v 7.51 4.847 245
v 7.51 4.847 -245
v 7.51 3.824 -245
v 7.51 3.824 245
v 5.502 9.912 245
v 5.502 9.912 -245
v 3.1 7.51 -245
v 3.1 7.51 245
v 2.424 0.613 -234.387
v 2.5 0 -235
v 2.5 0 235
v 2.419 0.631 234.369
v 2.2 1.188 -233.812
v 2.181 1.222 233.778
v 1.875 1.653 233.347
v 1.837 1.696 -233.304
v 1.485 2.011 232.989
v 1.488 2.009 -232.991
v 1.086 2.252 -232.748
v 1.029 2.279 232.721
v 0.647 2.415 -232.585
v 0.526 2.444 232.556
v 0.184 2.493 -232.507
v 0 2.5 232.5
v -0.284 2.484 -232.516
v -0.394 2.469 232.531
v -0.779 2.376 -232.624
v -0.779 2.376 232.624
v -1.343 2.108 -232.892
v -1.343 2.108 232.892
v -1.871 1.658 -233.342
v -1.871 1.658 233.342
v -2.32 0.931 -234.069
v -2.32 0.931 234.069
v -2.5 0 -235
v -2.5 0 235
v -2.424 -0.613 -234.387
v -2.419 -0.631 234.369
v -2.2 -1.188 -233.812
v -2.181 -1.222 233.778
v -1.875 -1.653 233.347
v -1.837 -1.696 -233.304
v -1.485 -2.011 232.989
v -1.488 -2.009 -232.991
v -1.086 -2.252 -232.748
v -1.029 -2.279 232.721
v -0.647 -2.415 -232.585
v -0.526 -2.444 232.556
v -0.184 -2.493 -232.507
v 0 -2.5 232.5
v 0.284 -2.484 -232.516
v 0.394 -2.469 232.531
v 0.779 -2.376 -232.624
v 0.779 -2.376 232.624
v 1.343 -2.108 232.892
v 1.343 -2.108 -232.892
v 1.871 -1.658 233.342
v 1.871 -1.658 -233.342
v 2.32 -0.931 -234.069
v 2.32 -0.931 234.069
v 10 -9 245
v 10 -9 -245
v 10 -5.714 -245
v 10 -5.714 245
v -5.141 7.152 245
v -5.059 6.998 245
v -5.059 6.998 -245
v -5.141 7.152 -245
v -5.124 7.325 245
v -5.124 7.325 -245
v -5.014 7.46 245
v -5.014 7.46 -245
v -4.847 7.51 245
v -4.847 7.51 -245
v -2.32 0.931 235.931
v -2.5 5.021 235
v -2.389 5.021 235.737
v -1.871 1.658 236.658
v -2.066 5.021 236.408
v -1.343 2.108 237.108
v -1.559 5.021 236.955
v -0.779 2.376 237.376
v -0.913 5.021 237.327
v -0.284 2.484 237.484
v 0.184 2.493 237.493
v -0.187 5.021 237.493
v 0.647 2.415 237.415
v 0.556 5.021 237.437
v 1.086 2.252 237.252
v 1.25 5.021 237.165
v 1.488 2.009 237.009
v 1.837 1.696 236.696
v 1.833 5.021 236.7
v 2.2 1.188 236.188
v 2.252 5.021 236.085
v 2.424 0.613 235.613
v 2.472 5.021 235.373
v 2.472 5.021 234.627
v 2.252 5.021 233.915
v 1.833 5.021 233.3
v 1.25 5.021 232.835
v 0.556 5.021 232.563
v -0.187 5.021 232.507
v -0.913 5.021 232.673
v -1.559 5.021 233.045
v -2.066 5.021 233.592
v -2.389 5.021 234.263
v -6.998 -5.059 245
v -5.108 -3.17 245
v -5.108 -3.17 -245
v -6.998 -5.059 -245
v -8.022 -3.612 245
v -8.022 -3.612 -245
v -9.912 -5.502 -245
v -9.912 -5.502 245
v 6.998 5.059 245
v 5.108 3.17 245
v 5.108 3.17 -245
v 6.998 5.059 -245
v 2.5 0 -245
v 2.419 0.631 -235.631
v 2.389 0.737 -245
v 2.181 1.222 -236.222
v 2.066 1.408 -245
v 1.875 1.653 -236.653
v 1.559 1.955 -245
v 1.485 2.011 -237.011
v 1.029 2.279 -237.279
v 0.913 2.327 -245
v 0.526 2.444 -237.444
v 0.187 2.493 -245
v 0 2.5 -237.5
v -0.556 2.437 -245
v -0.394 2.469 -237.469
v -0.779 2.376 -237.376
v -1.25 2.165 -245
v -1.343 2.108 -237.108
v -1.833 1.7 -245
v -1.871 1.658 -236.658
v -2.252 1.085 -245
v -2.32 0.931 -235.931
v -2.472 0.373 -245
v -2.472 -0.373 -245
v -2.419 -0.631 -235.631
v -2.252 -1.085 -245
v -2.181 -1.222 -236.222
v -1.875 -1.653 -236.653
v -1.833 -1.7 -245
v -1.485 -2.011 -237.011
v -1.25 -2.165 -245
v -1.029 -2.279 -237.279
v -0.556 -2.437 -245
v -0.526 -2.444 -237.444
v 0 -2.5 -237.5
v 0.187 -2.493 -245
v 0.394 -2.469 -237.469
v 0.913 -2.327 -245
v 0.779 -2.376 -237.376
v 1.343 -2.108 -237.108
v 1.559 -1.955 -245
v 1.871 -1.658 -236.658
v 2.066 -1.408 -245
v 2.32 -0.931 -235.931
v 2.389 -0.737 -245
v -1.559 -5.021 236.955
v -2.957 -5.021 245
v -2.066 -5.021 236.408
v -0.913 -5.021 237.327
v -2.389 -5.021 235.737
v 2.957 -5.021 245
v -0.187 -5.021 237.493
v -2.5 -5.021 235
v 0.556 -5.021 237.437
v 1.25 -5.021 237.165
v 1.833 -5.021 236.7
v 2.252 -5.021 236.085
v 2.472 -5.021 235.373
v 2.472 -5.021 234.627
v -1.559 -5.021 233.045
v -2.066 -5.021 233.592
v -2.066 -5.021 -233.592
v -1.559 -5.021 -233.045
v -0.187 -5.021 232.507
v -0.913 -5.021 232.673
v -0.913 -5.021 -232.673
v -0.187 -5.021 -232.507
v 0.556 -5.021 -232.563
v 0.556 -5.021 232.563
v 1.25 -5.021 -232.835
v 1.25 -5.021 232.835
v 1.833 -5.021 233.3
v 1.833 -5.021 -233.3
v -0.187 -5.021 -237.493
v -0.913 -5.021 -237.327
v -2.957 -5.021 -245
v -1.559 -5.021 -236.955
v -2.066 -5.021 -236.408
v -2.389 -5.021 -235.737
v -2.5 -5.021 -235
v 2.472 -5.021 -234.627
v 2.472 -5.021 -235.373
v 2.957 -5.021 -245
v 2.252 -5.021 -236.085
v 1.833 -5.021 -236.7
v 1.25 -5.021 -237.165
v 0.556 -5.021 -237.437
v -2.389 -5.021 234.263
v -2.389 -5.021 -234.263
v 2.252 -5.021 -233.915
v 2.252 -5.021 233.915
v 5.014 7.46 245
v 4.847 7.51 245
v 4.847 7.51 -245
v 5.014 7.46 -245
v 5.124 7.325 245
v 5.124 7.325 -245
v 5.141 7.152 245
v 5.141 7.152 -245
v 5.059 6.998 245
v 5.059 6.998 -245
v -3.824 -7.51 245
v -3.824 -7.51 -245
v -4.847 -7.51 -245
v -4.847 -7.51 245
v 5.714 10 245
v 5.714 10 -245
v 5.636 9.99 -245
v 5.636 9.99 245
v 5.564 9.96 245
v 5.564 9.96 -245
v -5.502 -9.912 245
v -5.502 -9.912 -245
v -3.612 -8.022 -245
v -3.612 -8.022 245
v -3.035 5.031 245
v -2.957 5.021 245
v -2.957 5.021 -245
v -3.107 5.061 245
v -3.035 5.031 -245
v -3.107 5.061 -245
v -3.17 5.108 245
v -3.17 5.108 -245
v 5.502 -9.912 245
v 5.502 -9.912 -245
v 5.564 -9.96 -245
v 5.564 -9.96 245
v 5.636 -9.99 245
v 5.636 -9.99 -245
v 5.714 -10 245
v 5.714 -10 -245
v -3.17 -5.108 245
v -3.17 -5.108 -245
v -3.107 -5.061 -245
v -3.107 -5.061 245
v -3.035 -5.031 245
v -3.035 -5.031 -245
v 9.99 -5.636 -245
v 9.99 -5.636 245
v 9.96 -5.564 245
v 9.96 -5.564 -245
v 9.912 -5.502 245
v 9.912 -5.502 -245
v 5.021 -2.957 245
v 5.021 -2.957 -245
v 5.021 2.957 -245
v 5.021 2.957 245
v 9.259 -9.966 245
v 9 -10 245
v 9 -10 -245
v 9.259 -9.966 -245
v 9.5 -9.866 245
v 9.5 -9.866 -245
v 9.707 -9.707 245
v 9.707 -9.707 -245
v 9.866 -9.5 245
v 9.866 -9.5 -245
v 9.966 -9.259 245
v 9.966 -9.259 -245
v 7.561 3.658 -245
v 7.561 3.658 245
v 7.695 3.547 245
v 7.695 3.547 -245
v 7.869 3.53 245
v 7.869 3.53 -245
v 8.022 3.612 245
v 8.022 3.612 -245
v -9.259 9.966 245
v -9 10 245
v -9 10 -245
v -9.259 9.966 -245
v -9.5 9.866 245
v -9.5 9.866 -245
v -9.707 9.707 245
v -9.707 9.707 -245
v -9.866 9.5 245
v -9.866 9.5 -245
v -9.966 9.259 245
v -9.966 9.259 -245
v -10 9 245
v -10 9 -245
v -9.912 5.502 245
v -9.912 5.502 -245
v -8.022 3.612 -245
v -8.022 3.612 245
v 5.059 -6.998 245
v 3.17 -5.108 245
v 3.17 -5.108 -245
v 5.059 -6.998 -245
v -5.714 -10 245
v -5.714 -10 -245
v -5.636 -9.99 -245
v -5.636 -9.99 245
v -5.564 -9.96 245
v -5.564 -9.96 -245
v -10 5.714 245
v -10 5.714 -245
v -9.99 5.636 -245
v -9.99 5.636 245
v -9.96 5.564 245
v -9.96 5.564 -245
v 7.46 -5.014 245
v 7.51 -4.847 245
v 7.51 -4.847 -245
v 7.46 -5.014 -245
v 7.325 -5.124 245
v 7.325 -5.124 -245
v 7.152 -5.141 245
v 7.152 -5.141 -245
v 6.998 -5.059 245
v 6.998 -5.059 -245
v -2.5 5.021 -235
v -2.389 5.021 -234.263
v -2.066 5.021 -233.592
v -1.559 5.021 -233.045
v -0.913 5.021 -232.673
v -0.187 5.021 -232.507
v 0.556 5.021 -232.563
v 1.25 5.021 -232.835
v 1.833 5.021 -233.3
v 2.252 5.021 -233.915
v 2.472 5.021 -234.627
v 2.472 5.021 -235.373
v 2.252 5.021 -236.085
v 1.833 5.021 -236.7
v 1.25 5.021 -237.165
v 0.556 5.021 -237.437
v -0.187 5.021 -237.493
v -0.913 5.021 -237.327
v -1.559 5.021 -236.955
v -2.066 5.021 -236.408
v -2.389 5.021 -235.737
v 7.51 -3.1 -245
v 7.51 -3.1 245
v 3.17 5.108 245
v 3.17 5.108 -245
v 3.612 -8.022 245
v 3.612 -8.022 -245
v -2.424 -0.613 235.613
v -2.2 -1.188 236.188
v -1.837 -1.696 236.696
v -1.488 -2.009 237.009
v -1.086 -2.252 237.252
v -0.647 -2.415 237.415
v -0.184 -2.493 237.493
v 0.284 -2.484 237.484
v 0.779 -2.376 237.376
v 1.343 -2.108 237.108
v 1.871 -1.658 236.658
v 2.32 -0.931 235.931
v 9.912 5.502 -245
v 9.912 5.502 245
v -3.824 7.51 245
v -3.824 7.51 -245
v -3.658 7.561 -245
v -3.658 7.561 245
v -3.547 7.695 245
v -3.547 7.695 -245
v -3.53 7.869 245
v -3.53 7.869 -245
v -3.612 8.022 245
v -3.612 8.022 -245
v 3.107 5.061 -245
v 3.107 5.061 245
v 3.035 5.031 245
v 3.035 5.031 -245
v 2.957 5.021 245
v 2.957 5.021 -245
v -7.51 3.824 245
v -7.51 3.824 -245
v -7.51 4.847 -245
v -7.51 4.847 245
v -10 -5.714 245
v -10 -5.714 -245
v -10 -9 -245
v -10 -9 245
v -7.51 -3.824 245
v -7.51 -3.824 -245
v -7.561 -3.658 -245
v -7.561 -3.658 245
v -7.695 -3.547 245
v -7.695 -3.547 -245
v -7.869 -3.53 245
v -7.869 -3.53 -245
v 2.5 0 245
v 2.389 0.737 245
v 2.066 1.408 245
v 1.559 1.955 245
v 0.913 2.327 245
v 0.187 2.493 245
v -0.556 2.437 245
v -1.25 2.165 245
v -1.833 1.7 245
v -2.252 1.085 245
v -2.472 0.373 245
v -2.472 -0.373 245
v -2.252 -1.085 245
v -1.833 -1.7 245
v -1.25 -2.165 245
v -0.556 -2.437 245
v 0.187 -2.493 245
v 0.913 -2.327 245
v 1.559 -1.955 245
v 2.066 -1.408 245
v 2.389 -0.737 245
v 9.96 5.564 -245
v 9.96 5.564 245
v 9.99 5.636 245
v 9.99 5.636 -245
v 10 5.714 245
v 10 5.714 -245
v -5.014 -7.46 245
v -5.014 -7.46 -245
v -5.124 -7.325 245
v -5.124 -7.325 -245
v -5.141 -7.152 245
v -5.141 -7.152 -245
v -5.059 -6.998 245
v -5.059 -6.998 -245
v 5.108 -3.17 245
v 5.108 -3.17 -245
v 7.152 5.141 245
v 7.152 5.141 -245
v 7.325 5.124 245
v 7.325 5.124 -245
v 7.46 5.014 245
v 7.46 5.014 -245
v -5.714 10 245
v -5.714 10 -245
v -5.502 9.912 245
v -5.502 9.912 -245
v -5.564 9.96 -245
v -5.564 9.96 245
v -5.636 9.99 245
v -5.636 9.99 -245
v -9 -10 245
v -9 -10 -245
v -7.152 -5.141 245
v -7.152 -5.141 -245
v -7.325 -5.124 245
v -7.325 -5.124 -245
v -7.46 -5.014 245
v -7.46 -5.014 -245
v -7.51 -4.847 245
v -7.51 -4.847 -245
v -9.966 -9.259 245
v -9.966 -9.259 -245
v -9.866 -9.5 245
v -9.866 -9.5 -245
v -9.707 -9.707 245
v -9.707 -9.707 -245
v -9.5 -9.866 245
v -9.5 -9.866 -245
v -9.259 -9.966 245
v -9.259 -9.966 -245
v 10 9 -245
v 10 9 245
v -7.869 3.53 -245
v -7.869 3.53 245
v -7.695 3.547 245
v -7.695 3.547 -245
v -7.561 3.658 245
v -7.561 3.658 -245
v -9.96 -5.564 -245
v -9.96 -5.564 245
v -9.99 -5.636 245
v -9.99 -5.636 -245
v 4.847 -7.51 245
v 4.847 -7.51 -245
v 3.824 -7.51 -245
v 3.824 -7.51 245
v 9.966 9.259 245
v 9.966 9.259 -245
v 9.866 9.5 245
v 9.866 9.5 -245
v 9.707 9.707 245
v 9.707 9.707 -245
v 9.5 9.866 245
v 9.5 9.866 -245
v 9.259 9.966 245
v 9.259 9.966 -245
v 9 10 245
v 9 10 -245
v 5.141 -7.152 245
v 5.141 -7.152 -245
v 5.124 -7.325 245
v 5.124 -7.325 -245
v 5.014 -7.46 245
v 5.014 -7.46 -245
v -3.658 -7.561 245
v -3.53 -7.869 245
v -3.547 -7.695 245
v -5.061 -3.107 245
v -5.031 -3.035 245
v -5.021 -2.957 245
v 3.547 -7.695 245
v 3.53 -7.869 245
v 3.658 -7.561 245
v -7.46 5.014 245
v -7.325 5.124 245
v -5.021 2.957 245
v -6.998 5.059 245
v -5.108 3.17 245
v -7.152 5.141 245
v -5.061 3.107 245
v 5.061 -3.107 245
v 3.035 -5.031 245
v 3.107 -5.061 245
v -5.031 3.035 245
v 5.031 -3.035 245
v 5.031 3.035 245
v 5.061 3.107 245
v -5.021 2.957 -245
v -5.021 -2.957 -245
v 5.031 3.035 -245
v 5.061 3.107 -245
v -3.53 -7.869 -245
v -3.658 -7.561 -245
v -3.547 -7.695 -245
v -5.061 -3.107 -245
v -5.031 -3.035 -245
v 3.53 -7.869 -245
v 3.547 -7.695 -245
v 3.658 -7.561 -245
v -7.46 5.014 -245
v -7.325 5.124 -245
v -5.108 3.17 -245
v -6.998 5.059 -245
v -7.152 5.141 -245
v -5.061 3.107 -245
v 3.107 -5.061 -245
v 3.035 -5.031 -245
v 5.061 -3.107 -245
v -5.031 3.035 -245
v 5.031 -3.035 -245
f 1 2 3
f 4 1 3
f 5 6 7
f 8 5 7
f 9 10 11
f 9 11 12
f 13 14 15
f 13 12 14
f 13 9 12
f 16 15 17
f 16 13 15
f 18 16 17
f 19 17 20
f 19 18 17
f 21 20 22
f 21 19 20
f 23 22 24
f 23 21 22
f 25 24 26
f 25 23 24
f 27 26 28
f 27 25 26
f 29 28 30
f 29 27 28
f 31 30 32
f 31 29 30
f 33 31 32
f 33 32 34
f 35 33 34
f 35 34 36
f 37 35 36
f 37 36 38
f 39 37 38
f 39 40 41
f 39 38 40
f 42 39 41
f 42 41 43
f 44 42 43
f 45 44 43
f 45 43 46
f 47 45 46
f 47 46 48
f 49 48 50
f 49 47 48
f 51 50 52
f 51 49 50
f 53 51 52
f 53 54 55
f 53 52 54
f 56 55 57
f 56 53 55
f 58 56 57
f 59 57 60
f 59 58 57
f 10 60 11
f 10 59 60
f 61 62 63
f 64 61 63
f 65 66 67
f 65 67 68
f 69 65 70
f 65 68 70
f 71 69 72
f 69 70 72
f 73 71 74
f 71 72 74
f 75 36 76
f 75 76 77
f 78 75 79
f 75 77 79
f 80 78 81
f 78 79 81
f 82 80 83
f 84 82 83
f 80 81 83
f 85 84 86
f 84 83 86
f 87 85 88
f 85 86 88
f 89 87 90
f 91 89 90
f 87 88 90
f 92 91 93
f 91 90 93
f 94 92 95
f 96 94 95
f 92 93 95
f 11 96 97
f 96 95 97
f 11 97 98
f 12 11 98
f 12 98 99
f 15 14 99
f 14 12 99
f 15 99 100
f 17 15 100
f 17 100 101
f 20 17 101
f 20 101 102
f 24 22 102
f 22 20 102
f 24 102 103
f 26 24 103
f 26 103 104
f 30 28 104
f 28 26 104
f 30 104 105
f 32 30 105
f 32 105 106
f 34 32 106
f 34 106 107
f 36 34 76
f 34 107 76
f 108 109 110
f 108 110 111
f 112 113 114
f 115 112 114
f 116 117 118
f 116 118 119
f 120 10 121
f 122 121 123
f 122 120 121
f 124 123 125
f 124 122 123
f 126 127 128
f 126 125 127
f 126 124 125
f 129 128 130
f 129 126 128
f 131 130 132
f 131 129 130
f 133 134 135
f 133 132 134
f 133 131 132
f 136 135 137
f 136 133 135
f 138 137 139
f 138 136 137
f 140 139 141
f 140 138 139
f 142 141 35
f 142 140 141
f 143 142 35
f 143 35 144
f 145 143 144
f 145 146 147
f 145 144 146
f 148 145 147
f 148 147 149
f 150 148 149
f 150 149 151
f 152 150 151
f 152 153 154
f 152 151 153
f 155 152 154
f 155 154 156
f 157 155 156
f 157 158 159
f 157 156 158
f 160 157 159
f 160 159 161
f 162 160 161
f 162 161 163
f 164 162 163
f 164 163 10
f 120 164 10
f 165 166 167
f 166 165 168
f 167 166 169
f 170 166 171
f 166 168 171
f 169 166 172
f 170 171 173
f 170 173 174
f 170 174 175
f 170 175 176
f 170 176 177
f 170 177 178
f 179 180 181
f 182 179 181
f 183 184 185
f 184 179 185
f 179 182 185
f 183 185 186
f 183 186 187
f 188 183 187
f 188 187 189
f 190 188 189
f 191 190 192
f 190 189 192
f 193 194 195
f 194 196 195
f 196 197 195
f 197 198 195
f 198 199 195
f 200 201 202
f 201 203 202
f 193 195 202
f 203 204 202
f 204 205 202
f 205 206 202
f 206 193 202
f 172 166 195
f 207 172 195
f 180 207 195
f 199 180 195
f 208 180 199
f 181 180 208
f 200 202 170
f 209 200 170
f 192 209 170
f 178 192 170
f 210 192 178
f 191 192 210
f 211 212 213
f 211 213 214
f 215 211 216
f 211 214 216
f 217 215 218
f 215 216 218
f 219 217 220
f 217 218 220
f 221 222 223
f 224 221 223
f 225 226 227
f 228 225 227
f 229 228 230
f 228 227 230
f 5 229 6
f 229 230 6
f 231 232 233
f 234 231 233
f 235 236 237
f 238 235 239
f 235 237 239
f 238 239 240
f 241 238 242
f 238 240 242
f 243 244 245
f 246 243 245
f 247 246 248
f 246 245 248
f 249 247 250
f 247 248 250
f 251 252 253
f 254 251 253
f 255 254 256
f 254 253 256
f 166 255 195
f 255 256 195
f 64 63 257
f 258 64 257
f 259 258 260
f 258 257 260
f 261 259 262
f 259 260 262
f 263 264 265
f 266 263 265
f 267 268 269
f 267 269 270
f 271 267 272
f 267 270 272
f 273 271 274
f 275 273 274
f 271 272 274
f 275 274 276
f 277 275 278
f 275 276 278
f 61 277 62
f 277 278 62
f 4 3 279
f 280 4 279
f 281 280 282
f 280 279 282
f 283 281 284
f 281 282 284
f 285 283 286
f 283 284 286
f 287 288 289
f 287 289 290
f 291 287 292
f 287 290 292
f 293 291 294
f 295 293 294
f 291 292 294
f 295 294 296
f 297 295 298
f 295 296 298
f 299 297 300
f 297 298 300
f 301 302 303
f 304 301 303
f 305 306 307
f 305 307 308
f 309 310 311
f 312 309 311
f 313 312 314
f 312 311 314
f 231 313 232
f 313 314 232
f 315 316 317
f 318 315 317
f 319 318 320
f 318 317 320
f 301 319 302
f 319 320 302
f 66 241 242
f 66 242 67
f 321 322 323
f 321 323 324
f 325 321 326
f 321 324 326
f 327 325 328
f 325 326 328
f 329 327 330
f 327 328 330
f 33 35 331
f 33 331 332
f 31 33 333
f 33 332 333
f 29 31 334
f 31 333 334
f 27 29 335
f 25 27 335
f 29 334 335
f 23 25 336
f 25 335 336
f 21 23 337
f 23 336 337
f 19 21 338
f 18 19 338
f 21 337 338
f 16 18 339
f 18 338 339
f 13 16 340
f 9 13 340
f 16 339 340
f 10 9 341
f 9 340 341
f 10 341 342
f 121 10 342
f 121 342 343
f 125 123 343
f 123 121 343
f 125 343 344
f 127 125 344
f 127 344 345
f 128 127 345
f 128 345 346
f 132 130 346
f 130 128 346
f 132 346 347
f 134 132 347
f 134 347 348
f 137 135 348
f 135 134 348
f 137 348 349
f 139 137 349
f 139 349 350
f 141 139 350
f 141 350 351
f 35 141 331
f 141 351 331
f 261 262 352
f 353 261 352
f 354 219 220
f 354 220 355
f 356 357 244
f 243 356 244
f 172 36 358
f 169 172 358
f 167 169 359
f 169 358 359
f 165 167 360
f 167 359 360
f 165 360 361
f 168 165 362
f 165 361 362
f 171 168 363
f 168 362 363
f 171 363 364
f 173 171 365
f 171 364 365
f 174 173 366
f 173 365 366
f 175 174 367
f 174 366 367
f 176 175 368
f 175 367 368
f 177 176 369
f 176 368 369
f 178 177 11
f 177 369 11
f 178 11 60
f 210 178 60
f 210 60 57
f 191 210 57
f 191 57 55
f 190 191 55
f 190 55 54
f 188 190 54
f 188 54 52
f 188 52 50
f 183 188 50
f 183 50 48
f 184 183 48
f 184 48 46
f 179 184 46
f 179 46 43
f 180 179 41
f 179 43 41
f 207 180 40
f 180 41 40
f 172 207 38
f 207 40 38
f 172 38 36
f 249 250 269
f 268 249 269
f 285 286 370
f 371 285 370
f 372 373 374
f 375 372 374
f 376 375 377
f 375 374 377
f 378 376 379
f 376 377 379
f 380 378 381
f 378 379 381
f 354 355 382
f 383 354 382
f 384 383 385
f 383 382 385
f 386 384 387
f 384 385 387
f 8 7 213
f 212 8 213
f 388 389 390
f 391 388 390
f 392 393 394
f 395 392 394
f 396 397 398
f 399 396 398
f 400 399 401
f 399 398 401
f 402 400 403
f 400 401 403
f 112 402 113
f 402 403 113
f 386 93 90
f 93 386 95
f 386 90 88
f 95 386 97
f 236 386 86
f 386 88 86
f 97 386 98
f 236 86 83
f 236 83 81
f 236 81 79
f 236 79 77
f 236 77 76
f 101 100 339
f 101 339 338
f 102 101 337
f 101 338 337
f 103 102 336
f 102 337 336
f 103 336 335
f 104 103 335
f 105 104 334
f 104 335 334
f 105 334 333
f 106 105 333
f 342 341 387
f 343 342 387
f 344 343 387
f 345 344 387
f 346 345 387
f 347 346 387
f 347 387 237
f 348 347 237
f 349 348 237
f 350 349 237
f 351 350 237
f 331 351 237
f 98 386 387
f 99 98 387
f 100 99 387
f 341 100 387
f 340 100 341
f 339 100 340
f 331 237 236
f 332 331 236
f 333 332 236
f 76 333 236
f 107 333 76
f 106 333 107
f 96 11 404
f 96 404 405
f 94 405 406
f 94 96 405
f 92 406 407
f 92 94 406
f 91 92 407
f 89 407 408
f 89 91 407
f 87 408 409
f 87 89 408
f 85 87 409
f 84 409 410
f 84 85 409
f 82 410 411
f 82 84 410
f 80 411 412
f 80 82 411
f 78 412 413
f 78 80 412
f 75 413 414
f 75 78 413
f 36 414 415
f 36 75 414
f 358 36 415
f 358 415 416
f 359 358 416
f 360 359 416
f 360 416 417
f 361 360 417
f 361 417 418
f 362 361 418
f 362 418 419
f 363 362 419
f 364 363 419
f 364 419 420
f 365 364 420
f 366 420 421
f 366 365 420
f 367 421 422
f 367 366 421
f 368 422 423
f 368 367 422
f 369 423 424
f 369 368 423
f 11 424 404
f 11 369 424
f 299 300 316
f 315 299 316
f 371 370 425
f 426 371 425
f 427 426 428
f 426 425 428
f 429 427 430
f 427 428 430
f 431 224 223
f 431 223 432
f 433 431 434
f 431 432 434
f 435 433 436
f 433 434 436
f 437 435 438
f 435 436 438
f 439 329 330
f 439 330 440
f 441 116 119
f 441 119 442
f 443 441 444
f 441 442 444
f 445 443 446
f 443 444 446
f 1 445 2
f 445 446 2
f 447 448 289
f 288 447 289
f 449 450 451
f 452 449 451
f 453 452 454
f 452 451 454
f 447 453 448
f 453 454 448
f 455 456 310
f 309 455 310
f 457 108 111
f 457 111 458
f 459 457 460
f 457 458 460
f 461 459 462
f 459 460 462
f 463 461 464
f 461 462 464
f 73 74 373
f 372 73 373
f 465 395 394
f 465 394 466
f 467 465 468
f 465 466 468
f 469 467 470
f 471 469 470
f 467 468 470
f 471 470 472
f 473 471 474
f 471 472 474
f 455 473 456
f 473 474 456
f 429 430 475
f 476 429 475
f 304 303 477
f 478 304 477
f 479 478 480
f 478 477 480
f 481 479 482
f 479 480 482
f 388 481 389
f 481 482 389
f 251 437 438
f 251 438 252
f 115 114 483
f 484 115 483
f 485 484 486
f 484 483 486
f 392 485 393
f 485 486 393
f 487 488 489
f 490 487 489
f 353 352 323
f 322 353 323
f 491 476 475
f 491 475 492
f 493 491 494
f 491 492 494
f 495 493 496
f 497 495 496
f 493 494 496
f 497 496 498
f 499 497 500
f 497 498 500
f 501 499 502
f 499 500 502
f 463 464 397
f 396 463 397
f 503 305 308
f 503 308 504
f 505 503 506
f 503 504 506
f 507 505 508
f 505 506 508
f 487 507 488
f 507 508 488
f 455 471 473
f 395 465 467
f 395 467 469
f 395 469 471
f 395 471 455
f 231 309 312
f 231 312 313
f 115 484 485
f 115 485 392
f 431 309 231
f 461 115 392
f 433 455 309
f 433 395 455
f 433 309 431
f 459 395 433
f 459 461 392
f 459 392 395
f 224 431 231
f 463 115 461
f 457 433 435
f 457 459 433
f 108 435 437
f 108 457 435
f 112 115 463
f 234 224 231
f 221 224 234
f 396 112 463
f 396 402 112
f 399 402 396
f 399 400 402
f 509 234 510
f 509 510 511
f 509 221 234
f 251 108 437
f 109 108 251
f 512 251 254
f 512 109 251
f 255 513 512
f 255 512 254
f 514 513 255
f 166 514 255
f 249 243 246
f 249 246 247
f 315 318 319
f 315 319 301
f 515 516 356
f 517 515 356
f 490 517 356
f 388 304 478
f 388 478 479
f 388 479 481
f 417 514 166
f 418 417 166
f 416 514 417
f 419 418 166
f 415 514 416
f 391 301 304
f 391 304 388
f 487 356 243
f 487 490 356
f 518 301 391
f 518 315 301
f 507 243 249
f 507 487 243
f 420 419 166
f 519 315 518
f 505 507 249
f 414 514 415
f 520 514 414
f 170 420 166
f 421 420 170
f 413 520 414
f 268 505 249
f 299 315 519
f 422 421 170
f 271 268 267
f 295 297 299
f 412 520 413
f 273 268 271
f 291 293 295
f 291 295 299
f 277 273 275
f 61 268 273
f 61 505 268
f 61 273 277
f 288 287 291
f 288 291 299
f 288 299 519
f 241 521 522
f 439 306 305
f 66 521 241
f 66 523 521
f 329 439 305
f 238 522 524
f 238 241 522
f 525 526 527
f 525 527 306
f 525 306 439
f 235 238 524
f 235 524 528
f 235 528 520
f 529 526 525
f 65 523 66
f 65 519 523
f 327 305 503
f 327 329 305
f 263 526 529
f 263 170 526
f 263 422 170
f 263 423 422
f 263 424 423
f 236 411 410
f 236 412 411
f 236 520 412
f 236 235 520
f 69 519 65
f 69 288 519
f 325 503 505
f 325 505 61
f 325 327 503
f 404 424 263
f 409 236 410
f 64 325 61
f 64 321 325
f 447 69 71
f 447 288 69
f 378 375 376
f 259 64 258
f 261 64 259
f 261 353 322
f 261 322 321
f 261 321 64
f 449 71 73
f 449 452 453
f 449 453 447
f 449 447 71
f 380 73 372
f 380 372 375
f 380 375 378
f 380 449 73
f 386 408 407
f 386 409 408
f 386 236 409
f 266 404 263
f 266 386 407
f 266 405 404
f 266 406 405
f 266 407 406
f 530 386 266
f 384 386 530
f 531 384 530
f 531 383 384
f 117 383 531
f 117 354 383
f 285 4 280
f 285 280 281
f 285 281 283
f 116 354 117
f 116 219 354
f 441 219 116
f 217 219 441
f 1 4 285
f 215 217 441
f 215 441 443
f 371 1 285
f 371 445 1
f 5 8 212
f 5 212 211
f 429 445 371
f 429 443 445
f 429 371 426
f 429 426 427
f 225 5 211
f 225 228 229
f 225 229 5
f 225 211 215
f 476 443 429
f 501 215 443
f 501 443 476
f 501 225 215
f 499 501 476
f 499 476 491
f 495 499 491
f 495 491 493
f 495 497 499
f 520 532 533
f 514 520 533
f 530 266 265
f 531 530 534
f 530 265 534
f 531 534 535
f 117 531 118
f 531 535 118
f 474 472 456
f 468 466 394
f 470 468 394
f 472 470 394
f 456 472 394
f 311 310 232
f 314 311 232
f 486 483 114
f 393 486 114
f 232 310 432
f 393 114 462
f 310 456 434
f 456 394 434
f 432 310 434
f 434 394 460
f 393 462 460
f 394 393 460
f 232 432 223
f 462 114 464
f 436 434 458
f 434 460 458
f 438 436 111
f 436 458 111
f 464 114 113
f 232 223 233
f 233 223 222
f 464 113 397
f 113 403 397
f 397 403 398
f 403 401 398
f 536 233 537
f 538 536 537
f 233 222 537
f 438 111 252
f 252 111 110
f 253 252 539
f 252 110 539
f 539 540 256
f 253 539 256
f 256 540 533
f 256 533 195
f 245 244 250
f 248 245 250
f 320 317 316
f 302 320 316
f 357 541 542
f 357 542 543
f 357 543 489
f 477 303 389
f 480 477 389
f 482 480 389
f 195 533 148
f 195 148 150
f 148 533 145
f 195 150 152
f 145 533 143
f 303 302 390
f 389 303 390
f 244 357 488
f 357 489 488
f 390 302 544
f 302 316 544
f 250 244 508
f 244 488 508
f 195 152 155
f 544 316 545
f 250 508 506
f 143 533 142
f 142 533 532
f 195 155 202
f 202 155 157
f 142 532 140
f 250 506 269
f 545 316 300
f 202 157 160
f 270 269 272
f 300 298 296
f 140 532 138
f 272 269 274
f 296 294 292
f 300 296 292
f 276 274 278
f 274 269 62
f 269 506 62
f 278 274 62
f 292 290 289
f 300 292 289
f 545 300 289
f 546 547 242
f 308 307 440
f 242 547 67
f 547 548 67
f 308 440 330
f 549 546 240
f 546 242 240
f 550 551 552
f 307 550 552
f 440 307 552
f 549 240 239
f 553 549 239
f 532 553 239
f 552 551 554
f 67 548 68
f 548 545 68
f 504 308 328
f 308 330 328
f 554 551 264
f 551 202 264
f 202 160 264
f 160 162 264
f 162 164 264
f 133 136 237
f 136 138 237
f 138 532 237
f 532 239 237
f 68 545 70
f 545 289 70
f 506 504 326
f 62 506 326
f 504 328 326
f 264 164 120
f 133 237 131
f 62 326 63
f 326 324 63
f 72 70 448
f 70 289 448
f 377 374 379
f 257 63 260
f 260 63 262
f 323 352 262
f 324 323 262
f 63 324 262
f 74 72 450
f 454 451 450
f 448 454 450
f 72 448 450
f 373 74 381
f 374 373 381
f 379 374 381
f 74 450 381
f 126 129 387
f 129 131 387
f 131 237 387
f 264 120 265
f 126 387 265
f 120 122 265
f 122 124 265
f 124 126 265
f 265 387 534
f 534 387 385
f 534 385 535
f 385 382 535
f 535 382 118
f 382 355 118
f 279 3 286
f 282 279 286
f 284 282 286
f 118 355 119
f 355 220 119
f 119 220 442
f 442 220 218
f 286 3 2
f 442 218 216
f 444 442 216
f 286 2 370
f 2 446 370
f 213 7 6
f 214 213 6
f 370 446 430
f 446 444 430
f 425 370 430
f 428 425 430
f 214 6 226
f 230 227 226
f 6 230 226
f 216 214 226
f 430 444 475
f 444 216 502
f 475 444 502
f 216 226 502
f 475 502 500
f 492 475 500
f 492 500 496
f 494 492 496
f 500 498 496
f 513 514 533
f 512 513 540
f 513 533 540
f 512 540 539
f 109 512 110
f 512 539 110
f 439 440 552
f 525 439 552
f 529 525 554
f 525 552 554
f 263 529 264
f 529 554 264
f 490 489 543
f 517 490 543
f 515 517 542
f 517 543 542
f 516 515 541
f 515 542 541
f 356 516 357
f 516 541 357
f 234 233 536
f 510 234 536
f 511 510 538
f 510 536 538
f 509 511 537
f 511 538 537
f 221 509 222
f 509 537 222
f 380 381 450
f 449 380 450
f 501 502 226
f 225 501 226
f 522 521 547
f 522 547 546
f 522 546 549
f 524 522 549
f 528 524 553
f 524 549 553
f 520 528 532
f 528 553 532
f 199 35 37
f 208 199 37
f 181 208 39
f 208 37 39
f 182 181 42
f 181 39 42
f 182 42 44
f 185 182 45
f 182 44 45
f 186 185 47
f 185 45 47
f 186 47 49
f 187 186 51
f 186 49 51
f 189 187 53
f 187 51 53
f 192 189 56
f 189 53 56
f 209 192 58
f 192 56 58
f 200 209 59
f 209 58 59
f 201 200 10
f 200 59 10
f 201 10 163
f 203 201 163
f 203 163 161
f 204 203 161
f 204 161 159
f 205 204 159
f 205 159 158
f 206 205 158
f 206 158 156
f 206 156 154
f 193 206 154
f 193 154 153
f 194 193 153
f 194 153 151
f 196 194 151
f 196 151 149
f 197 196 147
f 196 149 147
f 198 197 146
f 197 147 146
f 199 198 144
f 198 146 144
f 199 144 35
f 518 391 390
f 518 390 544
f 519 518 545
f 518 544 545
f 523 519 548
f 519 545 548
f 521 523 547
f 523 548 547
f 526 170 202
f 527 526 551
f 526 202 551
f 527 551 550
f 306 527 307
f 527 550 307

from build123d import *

# Parameters (mm, degrees)
CROQUIS11_R                = 2.5
MIEMBRO_ESTRUCTURAL1_DEPTH = 490
CROQUIS12_R                = 2.5
CORTAR_EXTRUIR1_DEPTH      = 12


with BuildPart() as part:
    # Croquis11 → Miembro estructural1 (new body)
    with BuildSketch(Plane.XY.offset(-245)):
        with BuildLine():
            Line((-9, -10), (-5.713990218, -10))
            ThreePointArc((-5.713990218, -10), (-5.599185189, -9.97716386), (-5.501858184, -9.912132034))
            Line((-5.501858184, -9.912132034), (-3.612132034, -8.022405885))
            ThreePointArc((-3.612132034, -8.022405885), (-3.547100209, -7.695468821), (-3.824264069, -7.51027385))
            Line((-3.824264069, -7.51027385), (-4.847118775, -7.51027385))
            ThreePointArc((-4.847118775, -7.51027385), (-5.124282635, -7.32507888), (-5.059250809, -6.998141816))
            Line((-5.059250809, -6.998141816), (-3.16952466, -5.108415666))
            ThreePointArc((-3.16952466, -5.108415666), (-3.072197655, -5.043383841), (-2.957392625, -5.0205477))
            Line((-2.957392625, -5.0205477), (2.957392625, -5.0205477))
            ThreePointArc((2.957392625, -5.0205477), (3.072197655, -5.043383841), (3.16952466, -5.108415666))
            Line((3.16952466, -5.108415666), (5.059250809, -6.998141816))
            ThreePointArc((5.059250809, -6.998141816), (5.124282635, -7.32507888), (4.847118775, -7.51027385))
            Line((4.847118775, -7.51027385), (3.824264069, -7.51027385))
            ThreePointArc((3.824264069, -7.51027385), (3.547100209, -7.695468821), (3.612132034, -8.022405885))
            Line((3.612132034, -8.022405885), (5.501858184, -9.912132034))
            ThreePointArc((5.501858184, -9.912132034), (5.599185189, -9.97716386), (5.713990218, -10))
            Line((5.713990218, -10), (9, -10))
            ThreePointArc((9, -10), (9.707106781, -9.707106781), (10, -9))
            Line((10, -9), (10, -5.713990218))
            ThreePointArc((10, -5.713990218), (9.97716386, -5.599185189), (9.912132034, -5.501858184))
            Line((9.912132034, -5.501858184), (7.51027385, -3.1))
            Line((7.51027385, -3.1), (7.51027385, -4.847118775))
            ThreePointArc((7.51027385, -4.847118775), (7.32507888, -5.124282635), (6.998141816, -5.059250809))
            Line((6.998141816, -5.059250809), (5.108415666, -3.16952466))
            ThreePointArc((5.108415666, -3.16952466), (5.043383841, -3.072197655), (5.0205477, -2.957392625))
            Line((5.0205477, -2.957392625), (5.0205477, 2.957392625))
            ThreePointArc((5.0205477, 2.957392625), (5.043383841, 3.072197655), (5.108415666, 3.16952466))
            Line((5.108415666, 3.16952466), (6.998141816, 5.059250809))
            ThreePointArc((6.998141816, 5.059250809), (7.32507888, 5.124282635), (7.51027385, 4.847118775))
            Line((7.51027385, 4.847118775), (7.51027385, 3.824264069))
            ThreePointArc((7.51027385, 3.824264069), (7.695468821, 3.547100209), (8.022405885, 3.612132034))
            Line((8.022405885, 3.612132034), (9.912132034, 5.501858184))
            ThreePointArc((9.912132034, 5.501858184), (9.97716386, 5.599185189), (10, 5.713990218))
            Line((10, 5.713990218), (10, 9))
            ThreePointArc((10, 9), (9.707106781, 9.707106781), (9, 10))
            Line((9, 10), (5.713990218, 10))
            ThreePointArc((5.713990218, 10), (5.599185189, 9.97716386), (5.501858184, 9.912132034))
            Line((5.501858184, 9.912132034), (3.1, 7.51027385))
            Line((3.1, 7.51027385), (4.847118775, 7.51027385))
            ThreePointArc((4.847118775, 7.51027385), (5.124282635, 7.32507888), (5.059250809, 6.998141816))
            Line((5.059250809, 6.998141816), (3.16952466, 5.108415666))
            ThreePointArc((3.16952466, 5.108415666), (3.072197655, 5.043383841), (2.957392625, 5.0205477))
            Line((2.957392625, 5.0205477), (-2.957392625, 5.0205477))
            ThreePointArc((-2.957392625, 5.0205477), (-3.072197655, 5.043383841), (-3.16952466, 5.108415666))
            Line((-3.16952466, 5.108415666), (-5.059250809, 6.998141816))
            ThreePointArc((-5.059250809, 6.998141816), (-5.124282635, 7.32507888), (-4.847118775, 7.51027385))
            Line((-4.847118775, 7.51027385), (-3.824264069, 7.51027385))
            ThreePointArc((-3.824264069, 7.51027385), (-3.547100209, 7.695468821), (-3.612132034, 8.022405885))
            Line((-3.612132034, 8.022405885), (-5.501858184, 9.912132034))
            ThreePointArc((-5.501858184, 9.912132034), (-5.599185189, 9.97716386), (-5.713990218, 10))
            Line((-5.713990218, 10), (-9, 10))
            ThreePointArc((-9, 10), (-9.707106781, 9.707106781), (-10, 9))
            Line((-10, 9), (-10, 5.713990218))
            ThreePointArc((-10, 5.713990218), (-9.97716386, 5.599185189), (-9.912132034, 5.501858184))
            Line((-9.912132034, 5.501858184), (-8.022405885, 3.612132034))
            ThreePointArc((-8.022405885, 3.612132034), (-7.695468821, 3.547100209), (-7.51027385, 3.824264069))
            Line((-7.51027385, 3.824264069), (-7.51027385, 4.847118775))
            ThreePointArc((-7.51027385, 4.847118775), (-7.32507888, 5.124282635), (-6.998141816, 5.059250809))
            Line((-6.998141816, 5.059250809), (-5.108415666, 3.16952466))
            ThreePointArc((-5.108415666, 3.16952466), (-5.043383841, 3.072197655), (-5.0205477, 2.957392625))
            Line((-5.0205477, 2.957392625), (-5.0205477, -2.957392625))
            ThreePointArc((-5.0205477, -2.957392625), (-5.043383841, -3.072197655), (-5.108415666, -3.16952466))
            Line((-5.108415666, -3.16952466), (-6.998141816, -5.059250809))
            ThreePointArc((-6.998141816, -5.059250809), (-7.32507888, -5.124282635), (-7.51027385, -4.847118775))
            Line((-7.51027385, -4.847118775), (-7.51027385, -3.824264069))
            ThreePointArc((-7.51027385, -3.824264069), (-7.695468821, -3.547100209), (-8.022405885, -3.612132034))
            Line((-8.022405885, -3.612132034), (-9.912132034, -5.501858184))
            ThreePointArc((-9.912132034, -5.501858184), (-9.97716386, -5.599185189), (-10, -5.713990218))
            Line((-10, -5.713990218), (-10, -9))
            ThreePointArc((-10, -9), (-9.707106781, -9.707106781), (-9, -10))
        make_face()
        Circle(CROQUIS11_R, mode=Mode.SUBTRACT)
    extrude(amount=MIEMBRO_ESTRUCTURAL1_DEPTH)

    # Croquis12 → Cortar-Extruir1 (cut)
    with BuildSketch(Plane(origin=(0, 5.0205477, 0), x_dir=(1, 0, 0), z_dir=(0, 1, 0))):
        with Locations(Location((0, 235, 0), (0, 0, 180))):
            Circle(CROQUIS12_R)
        with Locations(Location((0, -235, 0), (0, 0, 180))):
            Circle(CROQUIS12_R)
    extrude(amount=-CORTAR_EXTRUIR1_DEPTH, mode=Mode.SUBTRACT)


solid = part.part
